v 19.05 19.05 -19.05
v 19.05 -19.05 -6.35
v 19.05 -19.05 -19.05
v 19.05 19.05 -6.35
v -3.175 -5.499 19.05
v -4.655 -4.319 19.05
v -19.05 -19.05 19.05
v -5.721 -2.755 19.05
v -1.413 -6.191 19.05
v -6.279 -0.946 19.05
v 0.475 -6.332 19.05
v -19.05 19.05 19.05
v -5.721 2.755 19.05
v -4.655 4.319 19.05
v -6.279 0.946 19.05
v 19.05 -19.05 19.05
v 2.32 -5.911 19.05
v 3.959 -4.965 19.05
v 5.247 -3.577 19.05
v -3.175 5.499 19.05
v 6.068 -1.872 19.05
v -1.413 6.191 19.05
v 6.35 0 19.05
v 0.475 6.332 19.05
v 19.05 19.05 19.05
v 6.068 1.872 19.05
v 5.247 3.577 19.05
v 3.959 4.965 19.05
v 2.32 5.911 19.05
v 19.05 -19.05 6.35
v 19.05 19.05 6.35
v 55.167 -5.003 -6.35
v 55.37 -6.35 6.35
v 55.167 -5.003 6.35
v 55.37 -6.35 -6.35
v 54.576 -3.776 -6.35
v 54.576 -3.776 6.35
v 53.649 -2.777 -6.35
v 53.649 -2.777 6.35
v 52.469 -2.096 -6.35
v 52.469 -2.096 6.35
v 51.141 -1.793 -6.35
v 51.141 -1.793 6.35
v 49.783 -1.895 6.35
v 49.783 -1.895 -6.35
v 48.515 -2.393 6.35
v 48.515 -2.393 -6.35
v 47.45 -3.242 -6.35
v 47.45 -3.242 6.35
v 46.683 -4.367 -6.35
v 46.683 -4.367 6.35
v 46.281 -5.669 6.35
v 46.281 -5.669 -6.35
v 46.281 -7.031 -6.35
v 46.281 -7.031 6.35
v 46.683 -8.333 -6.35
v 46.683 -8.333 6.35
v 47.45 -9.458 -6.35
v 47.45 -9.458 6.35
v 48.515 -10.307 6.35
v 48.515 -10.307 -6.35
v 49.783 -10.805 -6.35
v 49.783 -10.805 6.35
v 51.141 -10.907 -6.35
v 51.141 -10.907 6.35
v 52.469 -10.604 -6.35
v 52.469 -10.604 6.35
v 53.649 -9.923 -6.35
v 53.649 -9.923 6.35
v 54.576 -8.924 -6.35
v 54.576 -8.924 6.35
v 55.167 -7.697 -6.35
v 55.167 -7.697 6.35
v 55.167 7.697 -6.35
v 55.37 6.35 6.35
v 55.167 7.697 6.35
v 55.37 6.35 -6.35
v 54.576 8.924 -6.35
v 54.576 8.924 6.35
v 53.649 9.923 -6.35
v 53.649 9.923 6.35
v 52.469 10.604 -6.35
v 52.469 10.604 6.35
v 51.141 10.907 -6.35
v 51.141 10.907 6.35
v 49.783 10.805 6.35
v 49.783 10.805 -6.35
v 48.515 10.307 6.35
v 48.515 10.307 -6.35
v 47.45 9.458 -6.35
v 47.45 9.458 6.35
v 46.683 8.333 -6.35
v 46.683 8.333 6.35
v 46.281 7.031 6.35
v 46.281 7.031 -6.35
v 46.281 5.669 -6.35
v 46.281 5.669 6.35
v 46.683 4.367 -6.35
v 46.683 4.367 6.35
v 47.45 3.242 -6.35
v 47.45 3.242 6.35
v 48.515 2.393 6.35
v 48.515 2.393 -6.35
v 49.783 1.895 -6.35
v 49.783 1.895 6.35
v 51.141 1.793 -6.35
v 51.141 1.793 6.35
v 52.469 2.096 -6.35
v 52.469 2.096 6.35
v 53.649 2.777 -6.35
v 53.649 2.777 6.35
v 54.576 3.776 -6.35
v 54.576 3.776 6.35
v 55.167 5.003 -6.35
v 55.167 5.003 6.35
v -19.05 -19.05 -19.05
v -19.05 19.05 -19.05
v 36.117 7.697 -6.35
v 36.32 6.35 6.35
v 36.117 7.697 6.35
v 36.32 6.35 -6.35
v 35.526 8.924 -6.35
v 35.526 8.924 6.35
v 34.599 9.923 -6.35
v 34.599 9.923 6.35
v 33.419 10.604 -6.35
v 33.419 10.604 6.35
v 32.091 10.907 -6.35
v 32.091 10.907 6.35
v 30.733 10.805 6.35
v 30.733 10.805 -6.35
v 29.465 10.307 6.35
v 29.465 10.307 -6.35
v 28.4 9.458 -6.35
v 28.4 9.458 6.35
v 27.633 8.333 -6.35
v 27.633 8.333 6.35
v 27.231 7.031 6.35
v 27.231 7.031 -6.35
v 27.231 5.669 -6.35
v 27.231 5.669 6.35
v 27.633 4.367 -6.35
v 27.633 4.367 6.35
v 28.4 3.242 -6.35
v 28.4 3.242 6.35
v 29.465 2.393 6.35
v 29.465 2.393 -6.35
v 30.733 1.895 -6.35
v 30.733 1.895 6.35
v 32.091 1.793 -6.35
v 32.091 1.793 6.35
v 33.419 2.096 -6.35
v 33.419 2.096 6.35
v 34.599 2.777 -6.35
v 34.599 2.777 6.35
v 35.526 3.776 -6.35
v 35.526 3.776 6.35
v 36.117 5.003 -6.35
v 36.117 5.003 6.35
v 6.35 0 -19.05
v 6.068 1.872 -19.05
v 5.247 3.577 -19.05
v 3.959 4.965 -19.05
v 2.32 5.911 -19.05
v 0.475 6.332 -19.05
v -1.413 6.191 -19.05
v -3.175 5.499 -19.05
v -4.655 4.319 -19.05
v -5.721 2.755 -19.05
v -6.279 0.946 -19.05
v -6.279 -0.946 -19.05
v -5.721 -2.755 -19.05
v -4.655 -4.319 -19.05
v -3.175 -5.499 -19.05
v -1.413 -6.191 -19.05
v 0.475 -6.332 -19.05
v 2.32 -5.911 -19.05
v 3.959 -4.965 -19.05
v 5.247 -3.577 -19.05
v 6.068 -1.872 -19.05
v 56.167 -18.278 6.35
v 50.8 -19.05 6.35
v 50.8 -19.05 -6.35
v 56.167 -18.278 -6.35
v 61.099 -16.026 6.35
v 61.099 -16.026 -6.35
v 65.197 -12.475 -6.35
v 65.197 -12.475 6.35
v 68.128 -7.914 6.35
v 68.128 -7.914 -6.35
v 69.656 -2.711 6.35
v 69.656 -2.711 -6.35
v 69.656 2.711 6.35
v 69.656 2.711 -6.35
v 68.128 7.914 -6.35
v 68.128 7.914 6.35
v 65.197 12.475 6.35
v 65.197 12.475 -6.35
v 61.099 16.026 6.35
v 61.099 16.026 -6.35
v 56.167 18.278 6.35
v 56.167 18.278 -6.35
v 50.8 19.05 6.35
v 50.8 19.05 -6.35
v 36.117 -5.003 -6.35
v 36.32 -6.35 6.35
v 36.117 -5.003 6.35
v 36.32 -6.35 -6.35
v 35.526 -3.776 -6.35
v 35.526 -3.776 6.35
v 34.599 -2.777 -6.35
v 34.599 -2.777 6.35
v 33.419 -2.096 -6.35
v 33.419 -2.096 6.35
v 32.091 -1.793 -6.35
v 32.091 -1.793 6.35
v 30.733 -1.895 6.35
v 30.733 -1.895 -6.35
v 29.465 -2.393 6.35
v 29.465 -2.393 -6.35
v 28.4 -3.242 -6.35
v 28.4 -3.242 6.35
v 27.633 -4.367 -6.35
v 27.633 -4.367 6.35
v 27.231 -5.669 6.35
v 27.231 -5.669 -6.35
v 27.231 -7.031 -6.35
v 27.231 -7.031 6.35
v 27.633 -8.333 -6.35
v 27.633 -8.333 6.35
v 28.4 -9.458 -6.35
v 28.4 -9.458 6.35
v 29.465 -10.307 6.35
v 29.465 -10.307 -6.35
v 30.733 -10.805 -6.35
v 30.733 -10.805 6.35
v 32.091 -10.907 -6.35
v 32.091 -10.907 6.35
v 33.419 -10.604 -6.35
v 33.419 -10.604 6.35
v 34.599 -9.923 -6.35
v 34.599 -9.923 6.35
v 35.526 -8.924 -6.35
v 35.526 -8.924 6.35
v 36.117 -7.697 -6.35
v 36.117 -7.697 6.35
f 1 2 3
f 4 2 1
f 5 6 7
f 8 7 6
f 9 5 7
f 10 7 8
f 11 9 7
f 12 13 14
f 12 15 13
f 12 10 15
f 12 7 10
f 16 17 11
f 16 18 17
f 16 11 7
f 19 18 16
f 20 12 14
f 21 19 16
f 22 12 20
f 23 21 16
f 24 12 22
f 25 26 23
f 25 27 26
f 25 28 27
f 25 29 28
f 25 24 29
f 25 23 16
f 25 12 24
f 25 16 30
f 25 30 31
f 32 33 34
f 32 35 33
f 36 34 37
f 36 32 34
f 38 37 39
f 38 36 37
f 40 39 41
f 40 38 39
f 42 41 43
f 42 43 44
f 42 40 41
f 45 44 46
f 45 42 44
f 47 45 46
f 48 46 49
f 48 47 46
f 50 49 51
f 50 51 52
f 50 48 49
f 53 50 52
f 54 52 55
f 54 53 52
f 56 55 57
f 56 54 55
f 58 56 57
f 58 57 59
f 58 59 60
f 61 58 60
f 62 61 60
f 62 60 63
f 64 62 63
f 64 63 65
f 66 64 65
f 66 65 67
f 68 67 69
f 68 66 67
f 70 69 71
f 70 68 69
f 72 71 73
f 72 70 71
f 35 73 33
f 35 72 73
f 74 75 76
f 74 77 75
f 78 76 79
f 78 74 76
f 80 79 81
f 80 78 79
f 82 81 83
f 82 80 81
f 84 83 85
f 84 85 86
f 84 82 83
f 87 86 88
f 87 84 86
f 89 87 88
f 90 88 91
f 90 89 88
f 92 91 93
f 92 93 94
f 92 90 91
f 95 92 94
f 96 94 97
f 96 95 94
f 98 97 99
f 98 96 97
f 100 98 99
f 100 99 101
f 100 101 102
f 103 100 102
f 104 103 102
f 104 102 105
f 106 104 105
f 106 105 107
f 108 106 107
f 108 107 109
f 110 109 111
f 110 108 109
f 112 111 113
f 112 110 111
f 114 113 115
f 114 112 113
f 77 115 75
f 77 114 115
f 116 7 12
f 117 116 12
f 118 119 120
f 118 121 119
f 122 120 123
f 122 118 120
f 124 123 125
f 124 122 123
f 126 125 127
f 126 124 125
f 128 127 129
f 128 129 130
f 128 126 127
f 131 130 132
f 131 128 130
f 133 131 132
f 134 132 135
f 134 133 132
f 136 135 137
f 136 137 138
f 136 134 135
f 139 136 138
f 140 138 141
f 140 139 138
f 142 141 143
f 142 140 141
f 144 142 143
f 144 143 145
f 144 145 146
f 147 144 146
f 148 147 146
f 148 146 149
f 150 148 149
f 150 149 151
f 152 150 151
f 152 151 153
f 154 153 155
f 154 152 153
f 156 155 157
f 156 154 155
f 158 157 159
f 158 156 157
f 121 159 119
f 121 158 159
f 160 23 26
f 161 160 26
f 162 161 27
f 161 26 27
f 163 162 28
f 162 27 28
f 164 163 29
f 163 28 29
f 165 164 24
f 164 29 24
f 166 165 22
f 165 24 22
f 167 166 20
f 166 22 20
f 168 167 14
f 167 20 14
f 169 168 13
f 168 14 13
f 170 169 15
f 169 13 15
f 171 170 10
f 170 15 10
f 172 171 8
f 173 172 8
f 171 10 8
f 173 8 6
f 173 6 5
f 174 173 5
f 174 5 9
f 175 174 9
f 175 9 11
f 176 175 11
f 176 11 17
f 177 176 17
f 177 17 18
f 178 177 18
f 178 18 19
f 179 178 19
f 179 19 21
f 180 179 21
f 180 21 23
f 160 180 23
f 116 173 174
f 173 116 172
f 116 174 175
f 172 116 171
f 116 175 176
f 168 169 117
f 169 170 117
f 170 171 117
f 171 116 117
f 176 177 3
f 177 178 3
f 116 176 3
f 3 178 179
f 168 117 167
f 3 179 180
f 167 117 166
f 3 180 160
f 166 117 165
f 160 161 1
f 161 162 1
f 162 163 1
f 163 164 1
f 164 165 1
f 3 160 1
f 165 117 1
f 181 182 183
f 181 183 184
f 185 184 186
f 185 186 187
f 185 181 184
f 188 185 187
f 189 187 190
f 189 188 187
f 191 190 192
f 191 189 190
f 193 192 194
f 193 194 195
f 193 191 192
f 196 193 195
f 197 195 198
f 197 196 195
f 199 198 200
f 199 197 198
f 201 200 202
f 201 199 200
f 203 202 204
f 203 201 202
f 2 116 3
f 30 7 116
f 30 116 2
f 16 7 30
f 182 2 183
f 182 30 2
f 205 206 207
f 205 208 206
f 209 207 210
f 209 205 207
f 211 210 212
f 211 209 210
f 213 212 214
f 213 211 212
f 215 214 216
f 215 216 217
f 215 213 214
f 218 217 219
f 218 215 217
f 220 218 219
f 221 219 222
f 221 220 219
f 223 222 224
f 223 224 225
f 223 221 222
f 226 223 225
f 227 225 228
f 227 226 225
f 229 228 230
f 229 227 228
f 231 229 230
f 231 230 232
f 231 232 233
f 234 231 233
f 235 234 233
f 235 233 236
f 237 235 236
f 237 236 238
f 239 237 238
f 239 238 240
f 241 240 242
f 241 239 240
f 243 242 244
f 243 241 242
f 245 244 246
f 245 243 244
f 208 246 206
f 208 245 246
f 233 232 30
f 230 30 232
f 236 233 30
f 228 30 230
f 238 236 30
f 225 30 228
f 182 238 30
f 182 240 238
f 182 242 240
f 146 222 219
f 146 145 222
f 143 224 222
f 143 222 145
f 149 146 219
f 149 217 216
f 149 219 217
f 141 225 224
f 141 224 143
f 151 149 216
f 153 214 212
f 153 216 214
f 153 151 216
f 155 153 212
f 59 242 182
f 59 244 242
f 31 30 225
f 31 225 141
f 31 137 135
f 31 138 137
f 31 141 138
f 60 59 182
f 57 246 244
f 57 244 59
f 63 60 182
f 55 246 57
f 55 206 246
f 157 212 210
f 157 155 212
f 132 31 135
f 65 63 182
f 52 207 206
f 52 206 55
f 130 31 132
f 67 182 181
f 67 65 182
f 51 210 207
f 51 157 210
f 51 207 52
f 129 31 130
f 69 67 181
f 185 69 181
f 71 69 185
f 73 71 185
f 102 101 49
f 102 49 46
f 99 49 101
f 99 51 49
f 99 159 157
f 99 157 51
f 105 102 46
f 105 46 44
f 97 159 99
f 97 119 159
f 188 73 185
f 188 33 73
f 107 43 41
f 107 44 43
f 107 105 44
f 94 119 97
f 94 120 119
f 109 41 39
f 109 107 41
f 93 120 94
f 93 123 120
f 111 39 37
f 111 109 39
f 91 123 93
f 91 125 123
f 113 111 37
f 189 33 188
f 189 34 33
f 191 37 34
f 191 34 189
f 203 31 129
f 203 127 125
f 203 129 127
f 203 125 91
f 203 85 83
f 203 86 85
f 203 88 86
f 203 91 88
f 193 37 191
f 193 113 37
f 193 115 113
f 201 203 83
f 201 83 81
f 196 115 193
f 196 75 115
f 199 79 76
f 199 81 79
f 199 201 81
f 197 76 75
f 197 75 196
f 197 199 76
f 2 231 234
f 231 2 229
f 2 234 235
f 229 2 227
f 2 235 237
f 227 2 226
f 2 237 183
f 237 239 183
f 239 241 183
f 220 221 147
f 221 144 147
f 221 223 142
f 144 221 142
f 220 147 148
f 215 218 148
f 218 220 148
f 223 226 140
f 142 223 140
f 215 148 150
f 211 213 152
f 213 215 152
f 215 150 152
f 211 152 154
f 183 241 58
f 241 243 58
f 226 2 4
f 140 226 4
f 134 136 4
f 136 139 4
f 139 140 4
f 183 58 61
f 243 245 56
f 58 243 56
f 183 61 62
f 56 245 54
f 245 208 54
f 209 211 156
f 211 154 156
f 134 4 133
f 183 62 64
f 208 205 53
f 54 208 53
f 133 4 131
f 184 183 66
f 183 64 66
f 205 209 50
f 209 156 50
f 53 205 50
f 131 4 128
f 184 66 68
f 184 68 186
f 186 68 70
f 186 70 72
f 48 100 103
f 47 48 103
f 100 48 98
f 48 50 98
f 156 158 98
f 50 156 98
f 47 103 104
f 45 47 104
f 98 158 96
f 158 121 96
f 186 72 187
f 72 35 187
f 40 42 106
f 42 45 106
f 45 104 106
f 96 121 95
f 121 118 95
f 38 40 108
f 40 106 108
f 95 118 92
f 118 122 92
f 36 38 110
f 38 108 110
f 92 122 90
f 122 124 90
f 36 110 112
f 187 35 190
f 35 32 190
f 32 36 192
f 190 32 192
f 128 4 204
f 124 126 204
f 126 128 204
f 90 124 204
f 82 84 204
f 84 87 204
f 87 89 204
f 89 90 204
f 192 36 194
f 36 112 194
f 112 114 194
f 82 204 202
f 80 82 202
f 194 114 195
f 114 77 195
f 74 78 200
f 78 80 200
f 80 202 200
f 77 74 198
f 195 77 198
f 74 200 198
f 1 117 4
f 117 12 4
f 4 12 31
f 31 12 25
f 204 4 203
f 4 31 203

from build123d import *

# Parameters (mm, degrees)
F0_W     = 38.1
F0_H     = 38.1
F1_DEPTH = 19.05
F0_R     = 4.569596
F2_DEPTH = 6.35
F3_R     = 6.35
F4_DEPTH = 38.101


with BuildPart() as f1:
    # F0 (on Top) → F1 (new body, symmetric)
    with BuildSketch(Plane.XY):
        Rectangle(F0_W, F0_H)
    extrude(amount=F1_DEPTH, both=True)

    # F0 (on Top) → F2 (join, symmetric)
    with BuildSketch(Plane.XY):
        with BuildLine():
            Line((19.05, 19.05), (19.05, -19.05))
            Line((19.05, -19.05), (50.8, -19.05))
            ThreePointArc((50.8, -19.05), (69.85, 0), (50.8, 19.05))
            Line((50.8, 19.05), (19.05, 19.05))
        make_face()
        with Locations((31.75, -6.35)):
            Circle(F0_R, mode=Mode.SUBTRACT)
        with Locations((50.8, -6.35)):
            Circle(F0_R, mode=Mode.SUBTRACT)
        with Locations((31.75, 6.35)):
            Circle(F0_R, mode=Mode.SUBTRACT)
        with Locations((50.8, 6.35)):
            Circle(F0_R, mode=Mode.SUBTRACT)
    extrude(amount=F2_DEPTH, both=True)

    # F3 (on face) → F4 (cut, through all)
    with BuildSketch(Plane.XY.offset(19.05)):
        Circle(F3_R)
    extrude(amount=-F4_DEPTH, mode=Mode.SUBTRACT)


solid = f1.part
